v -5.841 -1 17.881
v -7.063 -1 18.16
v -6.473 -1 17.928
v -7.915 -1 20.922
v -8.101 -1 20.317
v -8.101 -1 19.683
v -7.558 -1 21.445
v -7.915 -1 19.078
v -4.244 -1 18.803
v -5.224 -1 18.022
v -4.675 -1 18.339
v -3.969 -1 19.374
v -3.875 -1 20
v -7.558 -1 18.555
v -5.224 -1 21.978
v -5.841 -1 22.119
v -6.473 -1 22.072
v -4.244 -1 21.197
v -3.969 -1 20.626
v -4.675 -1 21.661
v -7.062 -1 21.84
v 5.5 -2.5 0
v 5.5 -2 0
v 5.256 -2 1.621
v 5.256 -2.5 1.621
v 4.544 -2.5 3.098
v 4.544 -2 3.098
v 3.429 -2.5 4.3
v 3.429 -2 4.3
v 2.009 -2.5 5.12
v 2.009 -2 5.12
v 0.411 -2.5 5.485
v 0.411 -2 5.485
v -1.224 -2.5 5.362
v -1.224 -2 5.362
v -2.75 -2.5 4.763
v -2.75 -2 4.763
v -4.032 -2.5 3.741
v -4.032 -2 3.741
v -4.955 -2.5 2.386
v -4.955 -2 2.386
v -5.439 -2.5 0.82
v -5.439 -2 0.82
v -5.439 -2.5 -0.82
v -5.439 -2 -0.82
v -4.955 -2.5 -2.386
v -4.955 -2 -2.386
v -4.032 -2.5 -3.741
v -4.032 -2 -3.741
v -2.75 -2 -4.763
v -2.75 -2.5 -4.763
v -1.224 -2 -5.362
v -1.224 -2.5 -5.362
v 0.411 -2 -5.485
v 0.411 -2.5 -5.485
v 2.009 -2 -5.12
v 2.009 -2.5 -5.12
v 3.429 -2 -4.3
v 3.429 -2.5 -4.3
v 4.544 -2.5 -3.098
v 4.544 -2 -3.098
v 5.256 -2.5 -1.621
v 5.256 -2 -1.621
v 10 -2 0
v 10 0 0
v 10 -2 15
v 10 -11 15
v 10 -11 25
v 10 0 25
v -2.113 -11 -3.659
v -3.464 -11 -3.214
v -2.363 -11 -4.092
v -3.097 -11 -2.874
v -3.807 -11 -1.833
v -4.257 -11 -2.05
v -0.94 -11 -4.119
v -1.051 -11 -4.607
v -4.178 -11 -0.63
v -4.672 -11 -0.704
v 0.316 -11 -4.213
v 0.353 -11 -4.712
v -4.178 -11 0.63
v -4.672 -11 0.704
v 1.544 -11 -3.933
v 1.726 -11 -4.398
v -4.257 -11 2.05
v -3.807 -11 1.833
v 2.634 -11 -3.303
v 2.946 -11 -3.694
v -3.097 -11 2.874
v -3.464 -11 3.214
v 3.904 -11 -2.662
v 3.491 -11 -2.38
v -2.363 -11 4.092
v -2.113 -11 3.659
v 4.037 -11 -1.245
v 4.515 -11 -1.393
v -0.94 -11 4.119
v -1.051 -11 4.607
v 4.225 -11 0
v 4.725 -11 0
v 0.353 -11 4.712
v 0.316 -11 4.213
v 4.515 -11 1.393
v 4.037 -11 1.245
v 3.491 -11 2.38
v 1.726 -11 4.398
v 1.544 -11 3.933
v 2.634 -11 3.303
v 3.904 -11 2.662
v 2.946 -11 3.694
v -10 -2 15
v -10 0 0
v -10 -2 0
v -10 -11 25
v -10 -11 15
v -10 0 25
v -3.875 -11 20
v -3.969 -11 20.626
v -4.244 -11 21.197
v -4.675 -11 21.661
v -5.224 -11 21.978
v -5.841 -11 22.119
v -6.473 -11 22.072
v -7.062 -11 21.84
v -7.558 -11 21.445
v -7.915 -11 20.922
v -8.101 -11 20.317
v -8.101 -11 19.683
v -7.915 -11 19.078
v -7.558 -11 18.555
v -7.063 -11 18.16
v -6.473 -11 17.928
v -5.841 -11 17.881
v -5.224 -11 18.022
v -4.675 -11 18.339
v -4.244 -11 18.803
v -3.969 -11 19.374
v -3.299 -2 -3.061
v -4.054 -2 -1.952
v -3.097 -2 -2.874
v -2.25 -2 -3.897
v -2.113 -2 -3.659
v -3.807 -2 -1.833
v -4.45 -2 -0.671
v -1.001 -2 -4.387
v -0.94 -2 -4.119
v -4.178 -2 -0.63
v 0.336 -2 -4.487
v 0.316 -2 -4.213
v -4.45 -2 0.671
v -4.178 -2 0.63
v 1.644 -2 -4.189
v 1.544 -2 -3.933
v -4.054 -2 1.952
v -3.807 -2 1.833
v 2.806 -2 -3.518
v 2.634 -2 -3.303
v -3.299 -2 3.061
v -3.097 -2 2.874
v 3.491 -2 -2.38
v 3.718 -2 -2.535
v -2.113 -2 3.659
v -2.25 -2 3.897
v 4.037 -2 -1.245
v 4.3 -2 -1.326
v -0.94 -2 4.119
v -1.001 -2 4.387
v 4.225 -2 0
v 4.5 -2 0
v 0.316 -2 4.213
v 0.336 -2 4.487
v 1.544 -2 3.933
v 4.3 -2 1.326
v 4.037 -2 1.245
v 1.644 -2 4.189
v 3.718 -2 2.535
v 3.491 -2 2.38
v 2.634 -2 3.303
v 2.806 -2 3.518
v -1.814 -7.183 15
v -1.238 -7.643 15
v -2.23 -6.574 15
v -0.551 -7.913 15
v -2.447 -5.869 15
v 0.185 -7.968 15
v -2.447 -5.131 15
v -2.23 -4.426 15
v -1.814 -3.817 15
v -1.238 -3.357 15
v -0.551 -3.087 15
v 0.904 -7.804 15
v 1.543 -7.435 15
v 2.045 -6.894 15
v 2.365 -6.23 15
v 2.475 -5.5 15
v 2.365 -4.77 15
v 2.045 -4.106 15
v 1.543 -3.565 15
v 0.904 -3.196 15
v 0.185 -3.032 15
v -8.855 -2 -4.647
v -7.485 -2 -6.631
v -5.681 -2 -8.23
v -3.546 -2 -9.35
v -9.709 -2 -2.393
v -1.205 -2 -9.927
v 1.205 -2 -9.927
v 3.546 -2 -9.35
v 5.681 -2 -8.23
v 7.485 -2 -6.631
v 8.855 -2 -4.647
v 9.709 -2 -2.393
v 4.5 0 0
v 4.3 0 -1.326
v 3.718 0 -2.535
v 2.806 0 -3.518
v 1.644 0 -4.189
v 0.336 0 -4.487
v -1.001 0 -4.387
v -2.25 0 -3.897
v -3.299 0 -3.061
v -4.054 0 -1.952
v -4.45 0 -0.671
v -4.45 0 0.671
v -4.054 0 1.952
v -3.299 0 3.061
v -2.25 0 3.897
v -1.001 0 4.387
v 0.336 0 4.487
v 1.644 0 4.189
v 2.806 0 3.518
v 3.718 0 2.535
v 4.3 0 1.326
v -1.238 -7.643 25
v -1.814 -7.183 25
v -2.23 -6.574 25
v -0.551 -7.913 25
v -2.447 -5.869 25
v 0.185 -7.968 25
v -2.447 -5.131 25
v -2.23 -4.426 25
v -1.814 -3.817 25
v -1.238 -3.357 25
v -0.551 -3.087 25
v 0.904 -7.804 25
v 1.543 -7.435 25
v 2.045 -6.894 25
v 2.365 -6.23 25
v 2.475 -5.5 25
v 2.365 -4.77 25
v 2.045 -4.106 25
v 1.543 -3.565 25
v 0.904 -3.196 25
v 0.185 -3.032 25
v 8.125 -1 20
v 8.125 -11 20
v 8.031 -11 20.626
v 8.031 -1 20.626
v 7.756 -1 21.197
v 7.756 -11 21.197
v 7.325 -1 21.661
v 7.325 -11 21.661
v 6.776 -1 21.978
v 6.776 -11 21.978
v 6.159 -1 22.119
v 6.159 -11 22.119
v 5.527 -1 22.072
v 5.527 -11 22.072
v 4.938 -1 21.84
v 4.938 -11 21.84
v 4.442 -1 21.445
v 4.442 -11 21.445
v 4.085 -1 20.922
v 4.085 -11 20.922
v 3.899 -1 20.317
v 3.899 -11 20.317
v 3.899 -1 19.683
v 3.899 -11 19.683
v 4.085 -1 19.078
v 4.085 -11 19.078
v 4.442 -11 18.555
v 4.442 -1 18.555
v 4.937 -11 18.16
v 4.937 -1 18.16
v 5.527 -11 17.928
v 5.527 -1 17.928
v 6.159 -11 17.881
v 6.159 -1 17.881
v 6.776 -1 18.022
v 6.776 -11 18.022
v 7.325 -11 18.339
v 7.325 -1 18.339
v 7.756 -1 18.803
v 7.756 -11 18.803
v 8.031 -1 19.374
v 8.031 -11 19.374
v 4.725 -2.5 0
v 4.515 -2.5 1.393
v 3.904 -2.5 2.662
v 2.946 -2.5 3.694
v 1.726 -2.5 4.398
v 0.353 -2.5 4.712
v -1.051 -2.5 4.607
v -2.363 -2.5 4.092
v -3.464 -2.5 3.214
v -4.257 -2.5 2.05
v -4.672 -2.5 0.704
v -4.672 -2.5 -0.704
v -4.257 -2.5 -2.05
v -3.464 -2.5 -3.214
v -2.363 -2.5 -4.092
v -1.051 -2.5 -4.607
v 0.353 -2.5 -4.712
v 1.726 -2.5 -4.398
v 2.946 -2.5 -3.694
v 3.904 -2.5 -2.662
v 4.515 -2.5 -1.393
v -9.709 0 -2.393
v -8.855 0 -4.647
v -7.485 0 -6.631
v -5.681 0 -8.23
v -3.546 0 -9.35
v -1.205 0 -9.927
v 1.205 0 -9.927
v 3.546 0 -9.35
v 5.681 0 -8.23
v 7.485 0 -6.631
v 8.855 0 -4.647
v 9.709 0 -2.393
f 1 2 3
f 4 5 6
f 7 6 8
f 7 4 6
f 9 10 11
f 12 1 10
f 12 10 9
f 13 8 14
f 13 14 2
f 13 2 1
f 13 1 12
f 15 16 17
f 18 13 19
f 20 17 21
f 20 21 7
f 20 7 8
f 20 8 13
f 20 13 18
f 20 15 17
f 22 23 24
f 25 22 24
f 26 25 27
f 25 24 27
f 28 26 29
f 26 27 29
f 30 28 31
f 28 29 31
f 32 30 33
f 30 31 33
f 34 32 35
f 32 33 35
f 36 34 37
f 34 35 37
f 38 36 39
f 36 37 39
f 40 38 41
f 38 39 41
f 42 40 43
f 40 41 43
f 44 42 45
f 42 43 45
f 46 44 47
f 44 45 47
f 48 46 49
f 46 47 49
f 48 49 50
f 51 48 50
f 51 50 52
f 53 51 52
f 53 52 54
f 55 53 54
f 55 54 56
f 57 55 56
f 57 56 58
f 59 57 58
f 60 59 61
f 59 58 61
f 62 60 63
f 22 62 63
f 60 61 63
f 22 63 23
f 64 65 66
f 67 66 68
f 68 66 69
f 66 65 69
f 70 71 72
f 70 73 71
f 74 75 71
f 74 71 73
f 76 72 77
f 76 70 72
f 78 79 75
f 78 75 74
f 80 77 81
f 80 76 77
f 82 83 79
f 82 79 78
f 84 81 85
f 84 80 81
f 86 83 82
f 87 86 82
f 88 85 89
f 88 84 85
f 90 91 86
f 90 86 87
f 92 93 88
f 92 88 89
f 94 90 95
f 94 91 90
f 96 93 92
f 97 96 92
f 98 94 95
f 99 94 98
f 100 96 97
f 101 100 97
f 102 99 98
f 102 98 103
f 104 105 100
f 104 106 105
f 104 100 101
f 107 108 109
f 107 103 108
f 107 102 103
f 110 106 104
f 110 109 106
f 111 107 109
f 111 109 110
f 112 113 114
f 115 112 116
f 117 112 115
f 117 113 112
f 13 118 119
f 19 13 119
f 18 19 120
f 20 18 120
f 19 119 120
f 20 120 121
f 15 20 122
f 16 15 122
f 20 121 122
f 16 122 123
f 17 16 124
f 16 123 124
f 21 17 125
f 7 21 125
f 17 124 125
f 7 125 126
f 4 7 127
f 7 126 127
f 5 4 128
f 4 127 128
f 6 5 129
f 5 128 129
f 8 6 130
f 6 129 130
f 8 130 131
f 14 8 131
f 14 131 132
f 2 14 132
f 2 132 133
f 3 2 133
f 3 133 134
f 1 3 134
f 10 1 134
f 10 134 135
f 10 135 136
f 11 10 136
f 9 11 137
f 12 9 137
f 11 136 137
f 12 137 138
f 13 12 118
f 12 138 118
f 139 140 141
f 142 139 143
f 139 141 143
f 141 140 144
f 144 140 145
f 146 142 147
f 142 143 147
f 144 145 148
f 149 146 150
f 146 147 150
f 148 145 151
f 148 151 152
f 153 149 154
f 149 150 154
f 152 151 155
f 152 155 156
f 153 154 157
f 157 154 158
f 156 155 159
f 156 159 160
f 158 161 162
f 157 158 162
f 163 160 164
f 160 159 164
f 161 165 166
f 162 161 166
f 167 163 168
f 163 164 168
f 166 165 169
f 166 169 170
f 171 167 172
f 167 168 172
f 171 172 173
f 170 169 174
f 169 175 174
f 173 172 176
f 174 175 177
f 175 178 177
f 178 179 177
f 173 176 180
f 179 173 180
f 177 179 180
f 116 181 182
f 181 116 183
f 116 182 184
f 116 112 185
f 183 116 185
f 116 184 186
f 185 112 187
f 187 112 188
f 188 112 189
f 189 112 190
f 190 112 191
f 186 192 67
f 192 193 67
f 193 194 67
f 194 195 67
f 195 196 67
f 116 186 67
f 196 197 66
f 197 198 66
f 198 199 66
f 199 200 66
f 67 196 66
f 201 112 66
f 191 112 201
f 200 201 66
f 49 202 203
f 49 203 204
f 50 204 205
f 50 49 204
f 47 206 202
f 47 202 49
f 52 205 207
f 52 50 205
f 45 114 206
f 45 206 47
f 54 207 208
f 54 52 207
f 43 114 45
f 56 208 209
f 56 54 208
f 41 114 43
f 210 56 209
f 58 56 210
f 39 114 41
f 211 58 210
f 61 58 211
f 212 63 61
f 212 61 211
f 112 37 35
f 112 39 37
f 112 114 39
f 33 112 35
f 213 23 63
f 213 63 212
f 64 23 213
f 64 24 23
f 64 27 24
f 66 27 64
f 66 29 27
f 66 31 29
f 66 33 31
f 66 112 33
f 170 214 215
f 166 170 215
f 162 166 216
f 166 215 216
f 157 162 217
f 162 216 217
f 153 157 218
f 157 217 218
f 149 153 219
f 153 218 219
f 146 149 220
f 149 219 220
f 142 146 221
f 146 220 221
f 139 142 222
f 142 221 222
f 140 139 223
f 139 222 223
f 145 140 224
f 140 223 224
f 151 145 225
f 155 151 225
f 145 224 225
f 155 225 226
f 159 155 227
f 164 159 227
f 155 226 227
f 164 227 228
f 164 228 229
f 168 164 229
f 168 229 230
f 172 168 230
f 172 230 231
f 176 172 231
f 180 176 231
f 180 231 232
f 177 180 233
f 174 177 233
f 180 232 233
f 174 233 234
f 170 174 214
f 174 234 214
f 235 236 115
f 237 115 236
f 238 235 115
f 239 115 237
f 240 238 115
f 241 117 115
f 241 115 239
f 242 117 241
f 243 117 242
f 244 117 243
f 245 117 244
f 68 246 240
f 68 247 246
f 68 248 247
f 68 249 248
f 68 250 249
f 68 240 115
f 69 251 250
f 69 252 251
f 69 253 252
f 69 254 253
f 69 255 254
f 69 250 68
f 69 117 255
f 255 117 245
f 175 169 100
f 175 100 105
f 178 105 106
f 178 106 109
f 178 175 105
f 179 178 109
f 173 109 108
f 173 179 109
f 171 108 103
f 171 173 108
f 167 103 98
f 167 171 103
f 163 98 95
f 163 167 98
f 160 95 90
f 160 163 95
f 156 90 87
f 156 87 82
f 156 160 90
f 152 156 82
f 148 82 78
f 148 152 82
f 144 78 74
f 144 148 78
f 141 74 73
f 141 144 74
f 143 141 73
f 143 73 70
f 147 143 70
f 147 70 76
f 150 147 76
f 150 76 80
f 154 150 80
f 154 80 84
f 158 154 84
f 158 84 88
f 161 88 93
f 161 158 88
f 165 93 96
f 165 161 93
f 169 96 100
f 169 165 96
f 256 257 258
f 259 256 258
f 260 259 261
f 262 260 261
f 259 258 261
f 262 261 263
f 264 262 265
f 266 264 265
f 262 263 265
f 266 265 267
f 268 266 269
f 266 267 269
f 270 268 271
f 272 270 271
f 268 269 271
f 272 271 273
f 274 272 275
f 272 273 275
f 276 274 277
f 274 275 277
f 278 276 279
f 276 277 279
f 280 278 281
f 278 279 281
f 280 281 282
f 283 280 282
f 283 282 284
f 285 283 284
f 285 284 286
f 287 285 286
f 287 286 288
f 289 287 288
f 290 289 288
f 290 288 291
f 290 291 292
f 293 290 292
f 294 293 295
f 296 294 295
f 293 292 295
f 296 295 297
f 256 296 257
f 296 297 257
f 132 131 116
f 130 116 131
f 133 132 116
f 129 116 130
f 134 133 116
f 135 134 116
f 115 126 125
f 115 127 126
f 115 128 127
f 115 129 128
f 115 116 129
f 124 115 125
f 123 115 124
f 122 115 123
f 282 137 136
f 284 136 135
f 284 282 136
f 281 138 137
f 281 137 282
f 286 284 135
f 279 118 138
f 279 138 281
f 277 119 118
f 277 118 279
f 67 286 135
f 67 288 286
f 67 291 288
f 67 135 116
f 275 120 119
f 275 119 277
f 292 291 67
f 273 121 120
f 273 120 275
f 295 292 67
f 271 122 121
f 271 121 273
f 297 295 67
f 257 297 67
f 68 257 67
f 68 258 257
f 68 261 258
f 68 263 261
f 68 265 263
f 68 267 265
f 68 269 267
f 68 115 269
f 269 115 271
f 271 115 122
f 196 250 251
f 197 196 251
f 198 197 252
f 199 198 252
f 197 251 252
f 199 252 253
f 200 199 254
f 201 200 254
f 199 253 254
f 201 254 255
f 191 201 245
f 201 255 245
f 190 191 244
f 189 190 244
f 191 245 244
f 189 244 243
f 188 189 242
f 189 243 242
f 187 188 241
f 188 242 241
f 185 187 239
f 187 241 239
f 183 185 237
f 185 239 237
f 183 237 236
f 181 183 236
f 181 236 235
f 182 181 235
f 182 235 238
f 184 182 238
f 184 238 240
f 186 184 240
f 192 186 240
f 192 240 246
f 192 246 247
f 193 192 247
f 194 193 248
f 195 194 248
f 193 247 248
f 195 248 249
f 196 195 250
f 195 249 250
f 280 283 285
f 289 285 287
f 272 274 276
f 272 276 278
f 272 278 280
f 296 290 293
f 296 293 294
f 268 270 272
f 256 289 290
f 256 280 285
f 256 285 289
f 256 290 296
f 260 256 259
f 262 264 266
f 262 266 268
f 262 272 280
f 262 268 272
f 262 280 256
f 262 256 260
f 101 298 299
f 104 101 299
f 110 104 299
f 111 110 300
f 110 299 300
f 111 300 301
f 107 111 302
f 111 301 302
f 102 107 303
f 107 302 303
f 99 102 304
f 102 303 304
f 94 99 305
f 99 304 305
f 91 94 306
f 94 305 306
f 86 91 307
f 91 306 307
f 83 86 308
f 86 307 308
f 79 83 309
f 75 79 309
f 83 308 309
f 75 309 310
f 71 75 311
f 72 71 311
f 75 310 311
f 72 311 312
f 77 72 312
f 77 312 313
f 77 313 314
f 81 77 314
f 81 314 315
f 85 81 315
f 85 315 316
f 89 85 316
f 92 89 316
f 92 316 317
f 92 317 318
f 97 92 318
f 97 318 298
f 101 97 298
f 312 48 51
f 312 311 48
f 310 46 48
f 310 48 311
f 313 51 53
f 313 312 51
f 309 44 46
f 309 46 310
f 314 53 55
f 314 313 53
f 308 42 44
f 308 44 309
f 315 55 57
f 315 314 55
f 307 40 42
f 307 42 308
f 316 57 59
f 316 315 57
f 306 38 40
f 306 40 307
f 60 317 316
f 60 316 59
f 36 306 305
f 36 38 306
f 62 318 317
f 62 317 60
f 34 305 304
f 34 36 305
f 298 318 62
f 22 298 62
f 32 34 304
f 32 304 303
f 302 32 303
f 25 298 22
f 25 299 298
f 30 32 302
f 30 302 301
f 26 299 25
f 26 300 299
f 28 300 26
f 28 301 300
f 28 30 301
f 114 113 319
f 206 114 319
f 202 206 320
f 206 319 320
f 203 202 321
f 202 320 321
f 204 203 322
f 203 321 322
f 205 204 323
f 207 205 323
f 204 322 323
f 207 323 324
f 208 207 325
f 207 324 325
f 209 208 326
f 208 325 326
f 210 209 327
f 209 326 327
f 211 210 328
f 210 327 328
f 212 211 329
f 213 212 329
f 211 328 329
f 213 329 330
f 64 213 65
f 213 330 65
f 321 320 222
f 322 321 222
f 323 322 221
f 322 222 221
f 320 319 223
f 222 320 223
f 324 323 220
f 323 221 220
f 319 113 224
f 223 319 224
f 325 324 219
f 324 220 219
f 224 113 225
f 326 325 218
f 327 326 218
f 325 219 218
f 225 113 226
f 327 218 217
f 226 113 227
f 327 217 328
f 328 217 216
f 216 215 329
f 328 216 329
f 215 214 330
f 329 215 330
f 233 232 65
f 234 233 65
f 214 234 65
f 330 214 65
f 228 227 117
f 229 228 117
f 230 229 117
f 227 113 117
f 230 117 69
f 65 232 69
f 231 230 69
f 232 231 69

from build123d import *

# Parameters (mm, degrees)
F1_DEPTH  = 2
F2_R      = 4.725
F2_R_2    = 4.225
F3_DEPTH  = 9
F4_W      = 20
F4_H      = 10
F5_DEPTH  = 9
F6_R      = 2.475
F7_DEPTH  = 10
F9_R      = 2.125
F10_DEPTH = 10
F12_R     = 5.5
F12_R_2   = 4.725
F13_DEPTH = 0.5


with BuildPart() as f1:
    # F0 (on Front) → F1 (new body)
    with BuildSketch(Plane.XZ):
        with BuildLine():
            ThreePointArc((-10, 8.3066238629), (0, 13), (10, 8.3066238629))
            Line((10, 8.3066238629), (10, 25))
            Line((10, 25), (-10, 25))
            Line((-10, 25), (-10, 8.3066238629))
        make_face()
        with BuildLine():
            Line((10, 0), (10, 8.3066238629))
            ThreePointArc((10, 8.3066238629), (0, 13), (-10, 8.3066238629))
            Line((-10, 8.3066238629), (-10, 0))
            ThreePointArc((-10, 0), (0, 10), (10, 0))
        make_face()
        with BuildLine():
            ThreePointArc((-10, 0), (0, -10), (10, 0))
            Line((10, 0), (5, 0))
            ThreePointArc((5, 0), (0, -5), (-5, 0))
            Line((-5, 0), (-10, 0))
        make_face()
        with BuildLine():
            Line((5, 0), (10, 0))
            ThreePointArc((10, 0), (0, 10), (-10, 0))
            Line((-10, 0), (-5, 0))
            ThreePointArc((-5, 0), (0, 5), (5, 0))
        make_face()
        with BuildLine():
            Line((4.5, 0), (5, 0))
            ThreePointArc((5, 0), (0, 5), (-5, 0))
            Line((-5, 0), (-4.5, 0))
            ThreePointArc((-4.5, 0), (0, 4.5), (4.5, 0))
        make_face()
        with BuildLine():
            ThreePointArc((-5, 0), (0, -5), (5, 0))
            Line((5, 0), (4.5, 0))
            ThreePointArc((4.5, 0), (0, -4.5), (-4.5, 0))
            Line((-4.5, 0), (-5, 0))
        make_face()
    extrude(amount=F1_DEPTH)

    # F2 (on face) → F3 (join)
    with BuildSketch(Plane.XZ.offset(2)):
        Circle(F2_R)
        Circle(F2_R_2, mode=Mode.SUBTRACT)
    extrude(amount=F3_DEPTH)

    # F4 (on face) → F5 (join)
    with BuildSketch(Plane.XZ.offset(2)):
        with Locations((0, 20)):
            Rectangle(F4_W, F4_H)
    extrude(amount=F5_DEPTH)


with BuildPart() as f7:
    # F6 (on face) → F7 (new body)
    with BuildSketch(Plane.XY.offset(25)):
        with Locations((0, -5.5)):
            Circle(F6_R)
    extrude(amount=-F7_DEPTH)


with BuildPart() as f1_1:
    add(f1.part)

    # F8: cut F7
    add(f7.part, mode=Mode.SUBTRACT)


with BuildPart() as f10:
    # F9 (on face) → F10 (new body)
    with BuildSketch(Plane.XZ.offset(11)):
        with Locations((-6, 20)):
            Circle(F9_R)
    extrude(amount=-F10_DEPTH)


with BuildPart() as f10b:
    # F9 (on face) → F10, piece 2 (new body)
    with BuildSketch(Plane.XZ.offset(11)):
        with Locations((6, 20)):
            Circle(F9_R)
    extrude(amount=-F10_DEPTH)


with BuildPart() as f1_2:
    add(f1_1.part)

    # F11: cut F10b, F10
    add(f10b.part, mode=Mode.SUBTRACT)
    add(f10.part, mode=Mode.SUBTRACT)

    # F12 (on face) → F13 (join)
    with BuildSketch(Plane.XZ.offset(2)):
        Circle(F12_R)
        Circle(F12_R_2, mode=Mode.SUBTRACT)
    extrude(amount=F13_DEPTH)


solid = f1_2.part
